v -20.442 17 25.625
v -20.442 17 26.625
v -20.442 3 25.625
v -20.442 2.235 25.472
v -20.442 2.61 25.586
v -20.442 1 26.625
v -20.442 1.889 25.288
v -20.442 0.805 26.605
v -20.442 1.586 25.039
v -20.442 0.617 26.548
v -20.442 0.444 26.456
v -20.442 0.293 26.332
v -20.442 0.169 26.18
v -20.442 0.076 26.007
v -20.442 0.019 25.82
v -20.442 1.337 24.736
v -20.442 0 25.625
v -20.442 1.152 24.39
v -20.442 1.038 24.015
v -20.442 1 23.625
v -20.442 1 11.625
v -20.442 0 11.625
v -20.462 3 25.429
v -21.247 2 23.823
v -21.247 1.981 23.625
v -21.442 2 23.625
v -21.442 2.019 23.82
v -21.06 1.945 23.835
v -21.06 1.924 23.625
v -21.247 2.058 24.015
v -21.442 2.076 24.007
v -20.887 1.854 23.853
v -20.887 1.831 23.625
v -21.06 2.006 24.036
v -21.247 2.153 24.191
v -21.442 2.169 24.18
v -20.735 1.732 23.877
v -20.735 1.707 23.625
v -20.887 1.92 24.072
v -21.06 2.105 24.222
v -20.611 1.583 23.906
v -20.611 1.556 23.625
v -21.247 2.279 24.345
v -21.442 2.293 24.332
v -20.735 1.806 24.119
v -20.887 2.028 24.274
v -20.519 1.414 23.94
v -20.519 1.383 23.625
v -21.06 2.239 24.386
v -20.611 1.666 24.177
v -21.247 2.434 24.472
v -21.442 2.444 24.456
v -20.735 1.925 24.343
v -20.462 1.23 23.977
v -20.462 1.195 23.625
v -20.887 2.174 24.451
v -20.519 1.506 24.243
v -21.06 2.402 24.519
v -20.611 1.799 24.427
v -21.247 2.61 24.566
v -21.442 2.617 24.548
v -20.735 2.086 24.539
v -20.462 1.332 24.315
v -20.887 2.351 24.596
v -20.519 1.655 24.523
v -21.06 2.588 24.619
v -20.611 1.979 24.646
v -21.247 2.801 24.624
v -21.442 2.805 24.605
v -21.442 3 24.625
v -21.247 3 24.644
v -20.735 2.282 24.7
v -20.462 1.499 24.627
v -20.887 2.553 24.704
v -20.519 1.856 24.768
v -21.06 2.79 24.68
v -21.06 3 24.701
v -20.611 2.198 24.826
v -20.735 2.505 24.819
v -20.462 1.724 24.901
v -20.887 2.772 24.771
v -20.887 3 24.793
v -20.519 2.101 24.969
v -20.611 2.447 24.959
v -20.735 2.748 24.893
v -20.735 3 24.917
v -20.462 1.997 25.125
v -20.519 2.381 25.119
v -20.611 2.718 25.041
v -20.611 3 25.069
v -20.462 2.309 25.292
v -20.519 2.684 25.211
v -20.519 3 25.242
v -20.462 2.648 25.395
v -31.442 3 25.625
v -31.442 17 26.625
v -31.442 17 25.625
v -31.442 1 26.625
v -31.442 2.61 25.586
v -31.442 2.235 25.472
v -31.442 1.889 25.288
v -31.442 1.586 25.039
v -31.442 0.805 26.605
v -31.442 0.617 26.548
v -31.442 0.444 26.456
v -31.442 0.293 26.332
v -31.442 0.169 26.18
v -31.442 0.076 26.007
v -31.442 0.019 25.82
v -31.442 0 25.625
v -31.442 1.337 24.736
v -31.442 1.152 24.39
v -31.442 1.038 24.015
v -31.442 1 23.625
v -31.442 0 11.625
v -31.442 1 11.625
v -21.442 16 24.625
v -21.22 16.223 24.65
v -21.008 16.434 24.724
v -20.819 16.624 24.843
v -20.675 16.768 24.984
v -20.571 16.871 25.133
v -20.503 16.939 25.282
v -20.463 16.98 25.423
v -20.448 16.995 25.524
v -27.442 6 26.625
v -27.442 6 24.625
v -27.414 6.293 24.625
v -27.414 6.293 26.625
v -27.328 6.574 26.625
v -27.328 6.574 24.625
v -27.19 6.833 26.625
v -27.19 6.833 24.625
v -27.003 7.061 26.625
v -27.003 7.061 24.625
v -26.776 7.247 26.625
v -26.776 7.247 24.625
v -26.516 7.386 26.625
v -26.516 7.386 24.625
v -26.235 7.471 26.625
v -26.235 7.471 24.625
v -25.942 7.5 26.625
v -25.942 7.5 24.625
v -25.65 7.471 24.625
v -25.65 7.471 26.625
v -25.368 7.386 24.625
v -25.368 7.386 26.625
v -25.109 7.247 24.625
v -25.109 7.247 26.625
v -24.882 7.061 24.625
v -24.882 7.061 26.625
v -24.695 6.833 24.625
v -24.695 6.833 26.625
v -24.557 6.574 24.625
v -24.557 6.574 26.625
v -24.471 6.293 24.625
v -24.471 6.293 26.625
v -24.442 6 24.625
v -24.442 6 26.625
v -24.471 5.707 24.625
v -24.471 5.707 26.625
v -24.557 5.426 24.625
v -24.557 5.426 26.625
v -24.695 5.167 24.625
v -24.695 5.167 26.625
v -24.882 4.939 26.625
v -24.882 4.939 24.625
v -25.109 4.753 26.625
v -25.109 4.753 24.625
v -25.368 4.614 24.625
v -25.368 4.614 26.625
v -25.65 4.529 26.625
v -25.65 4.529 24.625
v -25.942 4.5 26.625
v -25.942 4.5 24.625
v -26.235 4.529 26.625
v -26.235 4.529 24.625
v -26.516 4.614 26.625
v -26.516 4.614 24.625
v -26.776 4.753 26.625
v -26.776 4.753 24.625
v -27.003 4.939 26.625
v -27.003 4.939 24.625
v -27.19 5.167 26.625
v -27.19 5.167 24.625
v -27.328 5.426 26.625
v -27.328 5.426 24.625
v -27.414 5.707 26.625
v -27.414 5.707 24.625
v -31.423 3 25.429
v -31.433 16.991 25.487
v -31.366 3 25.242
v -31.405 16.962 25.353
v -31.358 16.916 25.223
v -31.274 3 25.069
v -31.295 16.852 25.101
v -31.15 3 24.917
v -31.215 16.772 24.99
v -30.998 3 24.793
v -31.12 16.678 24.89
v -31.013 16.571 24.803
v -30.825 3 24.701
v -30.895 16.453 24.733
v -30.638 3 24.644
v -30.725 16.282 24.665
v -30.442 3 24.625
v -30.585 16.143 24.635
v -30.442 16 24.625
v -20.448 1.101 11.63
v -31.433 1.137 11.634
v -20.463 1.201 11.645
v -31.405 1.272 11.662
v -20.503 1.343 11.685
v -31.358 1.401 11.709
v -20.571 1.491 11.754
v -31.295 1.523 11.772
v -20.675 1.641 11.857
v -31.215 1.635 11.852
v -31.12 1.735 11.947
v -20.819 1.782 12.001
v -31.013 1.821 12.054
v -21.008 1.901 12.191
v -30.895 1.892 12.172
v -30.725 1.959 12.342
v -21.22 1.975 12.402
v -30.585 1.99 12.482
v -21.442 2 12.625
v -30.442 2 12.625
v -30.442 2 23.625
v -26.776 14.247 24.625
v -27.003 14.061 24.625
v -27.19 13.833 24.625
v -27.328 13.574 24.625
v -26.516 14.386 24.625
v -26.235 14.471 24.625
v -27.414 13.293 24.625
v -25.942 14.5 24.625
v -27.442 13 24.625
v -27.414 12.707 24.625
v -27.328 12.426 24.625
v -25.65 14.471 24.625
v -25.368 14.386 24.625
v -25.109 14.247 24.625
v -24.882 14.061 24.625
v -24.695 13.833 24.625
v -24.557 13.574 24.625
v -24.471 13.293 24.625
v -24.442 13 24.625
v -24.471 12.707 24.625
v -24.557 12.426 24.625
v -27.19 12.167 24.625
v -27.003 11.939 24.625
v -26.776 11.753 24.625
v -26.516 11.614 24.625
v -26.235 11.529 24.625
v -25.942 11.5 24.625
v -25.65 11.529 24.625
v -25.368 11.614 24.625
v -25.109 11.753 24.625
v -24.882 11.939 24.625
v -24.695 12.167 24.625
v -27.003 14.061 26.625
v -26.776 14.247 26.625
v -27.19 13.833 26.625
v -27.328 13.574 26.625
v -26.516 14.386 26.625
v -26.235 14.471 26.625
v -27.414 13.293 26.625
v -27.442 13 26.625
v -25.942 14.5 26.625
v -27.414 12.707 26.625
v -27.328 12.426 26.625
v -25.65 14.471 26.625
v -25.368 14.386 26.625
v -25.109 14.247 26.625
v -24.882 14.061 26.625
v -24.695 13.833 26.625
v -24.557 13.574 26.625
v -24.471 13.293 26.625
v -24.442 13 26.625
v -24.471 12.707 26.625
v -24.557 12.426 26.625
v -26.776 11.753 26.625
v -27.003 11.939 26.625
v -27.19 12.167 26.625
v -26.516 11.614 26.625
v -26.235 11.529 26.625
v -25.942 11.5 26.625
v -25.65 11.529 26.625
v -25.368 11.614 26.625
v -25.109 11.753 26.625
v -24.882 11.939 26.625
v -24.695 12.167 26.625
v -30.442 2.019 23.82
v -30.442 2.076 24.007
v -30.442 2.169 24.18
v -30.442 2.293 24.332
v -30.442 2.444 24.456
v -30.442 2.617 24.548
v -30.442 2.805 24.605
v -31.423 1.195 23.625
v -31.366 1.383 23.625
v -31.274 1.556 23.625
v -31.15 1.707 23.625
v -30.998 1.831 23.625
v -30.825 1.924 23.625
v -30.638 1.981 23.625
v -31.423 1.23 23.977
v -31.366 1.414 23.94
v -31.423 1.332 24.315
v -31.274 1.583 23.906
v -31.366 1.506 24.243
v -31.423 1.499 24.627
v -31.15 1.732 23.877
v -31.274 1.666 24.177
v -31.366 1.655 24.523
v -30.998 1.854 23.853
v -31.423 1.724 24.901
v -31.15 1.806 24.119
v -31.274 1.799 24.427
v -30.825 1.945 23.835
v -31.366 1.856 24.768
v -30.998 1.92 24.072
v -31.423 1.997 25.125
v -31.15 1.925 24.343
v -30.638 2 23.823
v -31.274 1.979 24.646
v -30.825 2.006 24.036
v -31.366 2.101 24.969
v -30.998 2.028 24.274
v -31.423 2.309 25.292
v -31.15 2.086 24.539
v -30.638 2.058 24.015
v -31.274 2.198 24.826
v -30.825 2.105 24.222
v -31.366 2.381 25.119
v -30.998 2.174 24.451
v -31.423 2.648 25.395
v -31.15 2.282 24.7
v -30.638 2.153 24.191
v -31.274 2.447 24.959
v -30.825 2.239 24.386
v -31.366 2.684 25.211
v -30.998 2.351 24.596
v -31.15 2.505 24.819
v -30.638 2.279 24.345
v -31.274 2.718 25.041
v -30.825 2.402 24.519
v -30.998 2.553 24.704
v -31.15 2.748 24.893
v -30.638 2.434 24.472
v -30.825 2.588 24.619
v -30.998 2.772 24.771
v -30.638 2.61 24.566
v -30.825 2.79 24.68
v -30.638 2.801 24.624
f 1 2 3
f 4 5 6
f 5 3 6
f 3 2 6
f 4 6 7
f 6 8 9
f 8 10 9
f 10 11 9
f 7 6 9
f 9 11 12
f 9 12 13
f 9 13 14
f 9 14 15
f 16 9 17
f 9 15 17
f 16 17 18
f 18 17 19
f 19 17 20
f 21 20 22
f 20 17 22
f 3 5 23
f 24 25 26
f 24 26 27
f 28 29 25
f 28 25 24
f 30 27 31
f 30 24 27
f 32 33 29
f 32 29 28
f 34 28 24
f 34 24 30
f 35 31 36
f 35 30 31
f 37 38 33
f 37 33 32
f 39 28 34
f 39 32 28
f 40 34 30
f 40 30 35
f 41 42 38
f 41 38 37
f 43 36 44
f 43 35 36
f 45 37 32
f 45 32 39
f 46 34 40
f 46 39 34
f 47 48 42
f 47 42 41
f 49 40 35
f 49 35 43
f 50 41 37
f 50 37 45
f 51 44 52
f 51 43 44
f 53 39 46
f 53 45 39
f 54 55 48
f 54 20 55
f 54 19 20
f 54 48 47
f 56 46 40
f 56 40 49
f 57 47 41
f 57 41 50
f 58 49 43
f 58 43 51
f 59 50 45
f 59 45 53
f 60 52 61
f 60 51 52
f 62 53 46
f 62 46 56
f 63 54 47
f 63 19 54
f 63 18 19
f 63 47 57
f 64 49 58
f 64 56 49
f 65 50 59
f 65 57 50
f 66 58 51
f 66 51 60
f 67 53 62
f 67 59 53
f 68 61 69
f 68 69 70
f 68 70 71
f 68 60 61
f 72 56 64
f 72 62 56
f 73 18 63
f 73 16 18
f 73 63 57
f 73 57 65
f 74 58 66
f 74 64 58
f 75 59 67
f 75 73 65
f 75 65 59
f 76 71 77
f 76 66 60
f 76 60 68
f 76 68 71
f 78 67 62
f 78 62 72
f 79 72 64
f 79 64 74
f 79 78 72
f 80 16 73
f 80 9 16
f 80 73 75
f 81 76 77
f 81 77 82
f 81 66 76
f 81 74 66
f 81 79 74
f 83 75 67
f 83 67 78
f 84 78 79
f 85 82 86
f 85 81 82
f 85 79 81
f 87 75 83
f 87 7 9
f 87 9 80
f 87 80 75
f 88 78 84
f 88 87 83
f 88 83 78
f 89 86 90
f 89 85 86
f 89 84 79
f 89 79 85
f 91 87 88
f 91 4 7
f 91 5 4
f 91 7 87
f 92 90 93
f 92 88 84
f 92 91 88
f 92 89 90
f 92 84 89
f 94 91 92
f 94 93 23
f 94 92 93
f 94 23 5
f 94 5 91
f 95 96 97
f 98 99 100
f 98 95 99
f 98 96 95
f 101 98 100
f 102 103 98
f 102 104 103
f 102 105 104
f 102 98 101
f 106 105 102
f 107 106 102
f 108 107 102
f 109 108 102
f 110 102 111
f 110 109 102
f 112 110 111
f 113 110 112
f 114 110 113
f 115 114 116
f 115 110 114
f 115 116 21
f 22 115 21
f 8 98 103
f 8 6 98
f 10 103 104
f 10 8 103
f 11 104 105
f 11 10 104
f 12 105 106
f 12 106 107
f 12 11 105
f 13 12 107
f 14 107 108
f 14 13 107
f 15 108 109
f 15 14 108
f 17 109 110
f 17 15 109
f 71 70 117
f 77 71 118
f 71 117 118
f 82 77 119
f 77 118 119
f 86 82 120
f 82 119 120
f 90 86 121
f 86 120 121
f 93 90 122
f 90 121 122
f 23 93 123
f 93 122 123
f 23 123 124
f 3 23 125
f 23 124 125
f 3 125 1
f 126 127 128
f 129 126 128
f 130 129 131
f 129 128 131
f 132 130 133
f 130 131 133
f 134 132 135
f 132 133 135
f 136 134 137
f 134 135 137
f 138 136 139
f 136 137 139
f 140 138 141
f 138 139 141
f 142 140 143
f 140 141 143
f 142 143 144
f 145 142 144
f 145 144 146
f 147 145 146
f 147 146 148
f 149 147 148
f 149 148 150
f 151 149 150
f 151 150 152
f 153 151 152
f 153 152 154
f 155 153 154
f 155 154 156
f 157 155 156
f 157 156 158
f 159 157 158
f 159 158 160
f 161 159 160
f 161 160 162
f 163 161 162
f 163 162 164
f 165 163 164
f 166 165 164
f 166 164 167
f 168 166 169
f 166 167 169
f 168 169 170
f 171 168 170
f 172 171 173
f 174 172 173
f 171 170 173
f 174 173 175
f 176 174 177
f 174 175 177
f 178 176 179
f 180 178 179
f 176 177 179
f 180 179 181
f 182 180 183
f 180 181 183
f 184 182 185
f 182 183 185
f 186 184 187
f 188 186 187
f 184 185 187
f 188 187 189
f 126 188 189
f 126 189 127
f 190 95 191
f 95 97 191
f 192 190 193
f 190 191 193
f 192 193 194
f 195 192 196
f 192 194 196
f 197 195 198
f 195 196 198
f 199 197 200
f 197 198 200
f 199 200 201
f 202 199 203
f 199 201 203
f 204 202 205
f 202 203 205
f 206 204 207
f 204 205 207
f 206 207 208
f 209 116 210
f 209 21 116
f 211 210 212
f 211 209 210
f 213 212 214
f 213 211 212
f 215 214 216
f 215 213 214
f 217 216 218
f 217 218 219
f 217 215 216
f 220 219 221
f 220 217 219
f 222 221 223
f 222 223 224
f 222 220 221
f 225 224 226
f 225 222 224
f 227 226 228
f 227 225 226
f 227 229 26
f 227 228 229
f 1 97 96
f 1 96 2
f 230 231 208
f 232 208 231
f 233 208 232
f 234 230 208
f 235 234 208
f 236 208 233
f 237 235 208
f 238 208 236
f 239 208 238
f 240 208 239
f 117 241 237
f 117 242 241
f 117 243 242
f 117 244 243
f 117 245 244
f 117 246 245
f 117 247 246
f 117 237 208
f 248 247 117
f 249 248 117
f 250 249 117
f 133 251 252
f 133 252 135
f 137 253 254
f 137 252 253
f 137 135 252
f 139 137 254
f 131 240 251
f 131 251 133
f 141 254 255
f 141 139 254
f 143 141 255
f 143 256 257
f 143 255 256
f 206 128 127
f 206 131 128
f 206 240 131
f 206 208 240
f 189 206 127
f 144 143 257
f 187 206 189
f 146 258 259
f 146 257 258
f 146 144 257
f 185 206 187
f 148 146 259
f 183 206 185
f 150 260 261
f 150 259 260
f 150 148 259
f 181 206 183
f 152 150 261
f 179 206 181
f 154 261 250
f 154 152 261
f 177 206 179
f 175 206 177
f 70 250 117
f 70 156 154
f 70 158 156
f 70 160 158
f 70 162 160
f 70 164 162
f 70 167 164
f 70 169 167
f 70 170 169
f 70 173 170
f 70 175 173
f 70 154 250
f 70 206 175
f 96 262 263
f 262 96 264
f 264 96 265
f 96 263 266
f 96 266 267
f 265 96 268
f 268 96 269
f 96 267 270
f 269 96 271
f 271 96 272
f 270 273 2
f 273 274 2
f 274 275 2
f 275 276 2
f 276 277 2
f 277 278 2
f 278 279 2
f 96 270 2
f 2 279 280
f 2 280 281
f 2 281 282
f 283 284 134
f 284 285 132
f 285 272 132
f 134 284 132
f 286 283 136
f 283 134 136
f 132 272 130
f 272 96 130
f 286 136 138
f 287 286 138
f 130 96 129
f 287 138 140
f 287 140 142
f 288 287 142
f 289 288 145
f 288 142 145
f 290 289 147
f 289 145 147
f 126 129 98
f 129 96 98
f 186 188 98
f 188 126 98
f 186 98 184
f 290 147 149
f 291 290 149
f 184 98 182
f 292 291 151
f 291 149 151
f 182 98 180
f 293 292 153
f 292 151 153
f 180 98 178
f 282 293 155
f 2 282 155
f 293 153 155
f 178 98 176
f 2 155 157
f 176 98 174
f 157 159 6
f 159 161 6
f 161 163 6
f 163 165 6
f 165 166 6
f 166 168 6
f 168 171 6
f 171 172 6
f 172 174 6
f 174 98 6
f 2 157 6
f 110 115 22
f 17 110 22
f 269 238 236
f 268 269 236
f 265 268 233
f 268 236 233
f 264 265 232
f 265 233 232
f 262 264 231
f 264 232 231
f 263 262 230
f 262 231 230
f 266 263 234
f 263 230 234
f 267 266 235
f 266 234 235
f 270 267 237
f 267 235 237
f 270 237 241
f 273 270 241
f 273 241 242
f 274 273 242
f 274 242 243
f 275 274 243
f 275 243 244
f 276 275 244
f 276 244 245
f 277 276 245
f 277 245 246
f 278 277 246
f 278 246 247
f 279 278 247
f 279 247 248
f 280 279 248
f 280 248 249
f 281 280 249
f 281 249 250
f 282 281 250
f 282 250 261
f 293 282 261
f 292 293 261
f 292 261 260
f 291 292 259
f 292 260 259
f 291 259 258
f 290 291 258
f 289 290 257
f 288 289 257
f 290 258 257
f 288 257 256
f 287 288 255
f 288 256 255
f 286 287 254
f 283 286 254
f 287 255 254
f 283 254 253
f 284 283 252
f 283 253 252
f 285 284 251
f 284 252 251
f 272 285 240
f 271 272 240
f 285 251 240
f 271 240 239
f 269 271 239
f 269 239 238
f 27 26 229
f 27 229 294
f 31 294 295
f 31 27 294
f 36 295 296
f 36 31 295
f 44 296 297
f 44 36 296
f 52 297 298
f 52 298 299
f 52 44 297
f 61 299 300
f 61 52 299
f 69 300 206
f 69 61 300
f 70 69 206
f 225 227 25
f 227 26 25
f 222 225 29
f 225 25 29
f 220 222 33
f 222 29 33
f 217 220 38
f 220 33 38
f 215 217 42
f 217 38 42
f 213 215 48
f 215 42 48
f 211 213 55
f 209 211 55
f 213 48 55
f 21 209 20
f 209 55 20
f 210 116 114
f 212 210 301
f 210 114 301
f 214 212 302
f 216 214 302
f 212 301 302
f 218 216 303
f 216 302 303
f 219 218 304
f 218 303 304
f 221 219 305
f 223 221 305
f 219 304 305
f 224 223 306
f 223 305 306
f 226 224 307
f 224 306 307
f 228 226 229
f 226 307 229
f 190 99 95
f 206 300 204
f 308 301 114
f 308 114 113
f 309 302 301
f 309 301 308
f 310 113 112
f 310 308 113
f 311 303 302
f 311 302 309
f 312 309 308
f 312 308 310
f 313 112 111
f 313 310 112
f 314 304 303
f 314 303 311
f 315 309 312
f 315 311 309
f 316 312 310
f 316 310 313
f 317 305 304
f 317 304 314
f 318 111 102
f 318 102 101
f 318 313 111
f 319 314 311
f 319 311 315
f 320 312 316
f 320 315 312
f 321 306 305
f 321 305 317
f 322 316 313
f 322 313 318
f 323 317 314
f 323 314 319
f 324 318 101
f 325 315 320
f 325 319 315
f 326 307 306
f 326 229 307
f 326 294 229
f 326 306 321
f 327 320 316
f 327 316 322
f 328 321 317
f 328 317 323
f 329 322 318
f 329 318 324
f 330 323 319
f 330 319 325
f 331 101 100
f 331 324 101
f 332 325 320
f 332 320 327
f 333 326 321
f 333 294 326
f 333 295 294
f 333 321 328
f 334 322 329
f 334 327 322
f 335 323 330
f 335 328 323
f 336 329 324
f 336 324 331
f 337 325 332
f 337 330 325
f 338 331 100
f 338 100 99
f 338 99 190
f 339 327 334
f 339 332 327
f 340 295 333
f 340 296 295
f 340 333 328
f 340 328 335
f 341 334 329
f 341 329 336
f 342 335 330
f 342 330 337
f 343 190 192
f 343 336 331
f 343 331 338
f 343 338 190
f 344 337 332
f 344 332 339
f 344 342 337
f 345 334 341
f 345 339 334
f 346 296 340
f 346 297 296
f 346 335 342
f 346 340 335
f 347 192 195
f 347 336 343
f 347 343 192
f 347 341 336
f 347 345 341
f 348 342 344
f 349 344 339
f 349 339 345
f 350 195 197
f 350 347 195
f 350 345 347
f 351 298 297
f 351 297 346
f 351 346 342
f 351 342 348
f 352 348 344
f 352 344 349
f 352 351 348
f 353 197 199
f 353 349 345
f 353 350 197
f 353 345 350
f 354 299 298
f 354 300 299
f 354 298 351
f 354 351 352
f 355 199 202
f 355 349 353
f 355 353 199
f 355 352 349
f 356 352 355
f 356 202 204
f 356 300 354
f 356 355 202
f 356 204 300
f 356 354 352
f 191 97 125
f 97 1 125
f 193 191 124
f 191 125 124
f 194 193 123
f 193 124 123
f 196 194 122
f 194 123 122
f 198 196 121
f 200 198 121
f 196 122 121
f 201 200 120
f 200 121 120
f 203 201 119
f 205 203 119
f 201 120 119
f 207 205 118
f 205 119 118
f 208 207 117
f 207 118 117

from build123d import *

# Parameters (mm, degrees)
ESBO_O1_W                = 11
ESBO_O1_H                = 19
RESSALTO_EXTRUS_O1_DEPTH = 2
ESBO_O2_W                = 11
ESBO_O2_H                = 2
RESSALTO_EXTRUS_O2_DEPTH = 15
ESBO_O3_R                = 1.5
CORTE_EXTRUS_O1_DEPTH    = 15
ESBO_O4_W                = 11
ESBO_O4_H                = 4
CORTE_EXTRUS_O2_DEPTH    = 15
FILETE1_R                = 1
FILETE2_R                = 1


with BuildPart() as part:
    # Esboço1 → Ressalto-extrusão1 (new body)
    with BuildSketch(Plane(origin=(0, 0, 0), x_dir=(1, 0, 0), z_dir=(0, 1, 0))):
        with Locations((-25.942415051, -17.124578687)):
            Rectangle(ESBO_O1_W, ESBO_O1_H)
    extrude(amount=RESSALTO_EXTRUS_O1_DEPTH)

    # Esboço2 → Ressalto-extrusão2 (add)
    with BuildSketch(Plane(origin=(0, 2, 0), x_dir=(1, 0, 0), z_dir=(0, 1, 0))):
        with Locations((-25.942415051, -25.624578687)):
            Rectangle(ESBO_O2_W, ESBO_O2_H)
    extrude(amount=RESSALTO_EXTRUS_O2_DEPTH)

    # Esboço3 → Corte-extrusão1 (cut)
    with BuildSketch(Plane(origin=(0, 0, 24.624578687), x_dir=(-1, 0, 0), z_dir=(0, 0, -1))):
        with Locations((25.942415051, 6)):
            Circle(ESBO_O3_R)
        with Locations((25.942415051, 13)):
            Circle(ESBO_O3_R)
    extrude(amount=-CORTE_EXTRUS_O1_DEPTH, mode=Mode.SUBTRACT)

    # Esboço4 → Corte-extrusão2 (cut)
    with BuildSketch(Plane(origin=(0, 2, 0), x_dir=(1, 0, 0), z_dir=(0, 1, 0))):
        with Locations((-25.942415051, -9.624578687)):
            Rectangle(ESBO_O4_W, ESBO_O4_H)
    extrude(amount=-CORTE_EXTRUS_O2_DEPTH, mode=Mode.SUBTRACT)

    # Filete1
    filete1_edges = [part.edges().sort_by_distance(p)[0] for p in [
        (-25.942415051, 2, 24.624578687),
        (-25.942415051, 0, 26.624578687),
    ]]
    fillet(filete1_edges, radius=FILETE1_R)

    # Filete2
    filete2_edges = [part.edges().sort_by_distance(p)[0] for p in [
        (-31.442415051, 10, 24.624578687),
        (-20.442415051, 10, 24.624578687),
        (-25.942415051, 17, 24.624578687),
        (-31.442415051, 2, 17.624578687),
        (-25.942415051, 2, 11.624578687),
        (-20.442415051, 2, 17.624578687),
        (-31.442415051, 2.292893219, 24.331685469),
        (-20.442415051, 2.292893219, 24.331685469),
    ]]
    fillet(filete2_edges, radius=FILETE2_R)


solid = part.part
